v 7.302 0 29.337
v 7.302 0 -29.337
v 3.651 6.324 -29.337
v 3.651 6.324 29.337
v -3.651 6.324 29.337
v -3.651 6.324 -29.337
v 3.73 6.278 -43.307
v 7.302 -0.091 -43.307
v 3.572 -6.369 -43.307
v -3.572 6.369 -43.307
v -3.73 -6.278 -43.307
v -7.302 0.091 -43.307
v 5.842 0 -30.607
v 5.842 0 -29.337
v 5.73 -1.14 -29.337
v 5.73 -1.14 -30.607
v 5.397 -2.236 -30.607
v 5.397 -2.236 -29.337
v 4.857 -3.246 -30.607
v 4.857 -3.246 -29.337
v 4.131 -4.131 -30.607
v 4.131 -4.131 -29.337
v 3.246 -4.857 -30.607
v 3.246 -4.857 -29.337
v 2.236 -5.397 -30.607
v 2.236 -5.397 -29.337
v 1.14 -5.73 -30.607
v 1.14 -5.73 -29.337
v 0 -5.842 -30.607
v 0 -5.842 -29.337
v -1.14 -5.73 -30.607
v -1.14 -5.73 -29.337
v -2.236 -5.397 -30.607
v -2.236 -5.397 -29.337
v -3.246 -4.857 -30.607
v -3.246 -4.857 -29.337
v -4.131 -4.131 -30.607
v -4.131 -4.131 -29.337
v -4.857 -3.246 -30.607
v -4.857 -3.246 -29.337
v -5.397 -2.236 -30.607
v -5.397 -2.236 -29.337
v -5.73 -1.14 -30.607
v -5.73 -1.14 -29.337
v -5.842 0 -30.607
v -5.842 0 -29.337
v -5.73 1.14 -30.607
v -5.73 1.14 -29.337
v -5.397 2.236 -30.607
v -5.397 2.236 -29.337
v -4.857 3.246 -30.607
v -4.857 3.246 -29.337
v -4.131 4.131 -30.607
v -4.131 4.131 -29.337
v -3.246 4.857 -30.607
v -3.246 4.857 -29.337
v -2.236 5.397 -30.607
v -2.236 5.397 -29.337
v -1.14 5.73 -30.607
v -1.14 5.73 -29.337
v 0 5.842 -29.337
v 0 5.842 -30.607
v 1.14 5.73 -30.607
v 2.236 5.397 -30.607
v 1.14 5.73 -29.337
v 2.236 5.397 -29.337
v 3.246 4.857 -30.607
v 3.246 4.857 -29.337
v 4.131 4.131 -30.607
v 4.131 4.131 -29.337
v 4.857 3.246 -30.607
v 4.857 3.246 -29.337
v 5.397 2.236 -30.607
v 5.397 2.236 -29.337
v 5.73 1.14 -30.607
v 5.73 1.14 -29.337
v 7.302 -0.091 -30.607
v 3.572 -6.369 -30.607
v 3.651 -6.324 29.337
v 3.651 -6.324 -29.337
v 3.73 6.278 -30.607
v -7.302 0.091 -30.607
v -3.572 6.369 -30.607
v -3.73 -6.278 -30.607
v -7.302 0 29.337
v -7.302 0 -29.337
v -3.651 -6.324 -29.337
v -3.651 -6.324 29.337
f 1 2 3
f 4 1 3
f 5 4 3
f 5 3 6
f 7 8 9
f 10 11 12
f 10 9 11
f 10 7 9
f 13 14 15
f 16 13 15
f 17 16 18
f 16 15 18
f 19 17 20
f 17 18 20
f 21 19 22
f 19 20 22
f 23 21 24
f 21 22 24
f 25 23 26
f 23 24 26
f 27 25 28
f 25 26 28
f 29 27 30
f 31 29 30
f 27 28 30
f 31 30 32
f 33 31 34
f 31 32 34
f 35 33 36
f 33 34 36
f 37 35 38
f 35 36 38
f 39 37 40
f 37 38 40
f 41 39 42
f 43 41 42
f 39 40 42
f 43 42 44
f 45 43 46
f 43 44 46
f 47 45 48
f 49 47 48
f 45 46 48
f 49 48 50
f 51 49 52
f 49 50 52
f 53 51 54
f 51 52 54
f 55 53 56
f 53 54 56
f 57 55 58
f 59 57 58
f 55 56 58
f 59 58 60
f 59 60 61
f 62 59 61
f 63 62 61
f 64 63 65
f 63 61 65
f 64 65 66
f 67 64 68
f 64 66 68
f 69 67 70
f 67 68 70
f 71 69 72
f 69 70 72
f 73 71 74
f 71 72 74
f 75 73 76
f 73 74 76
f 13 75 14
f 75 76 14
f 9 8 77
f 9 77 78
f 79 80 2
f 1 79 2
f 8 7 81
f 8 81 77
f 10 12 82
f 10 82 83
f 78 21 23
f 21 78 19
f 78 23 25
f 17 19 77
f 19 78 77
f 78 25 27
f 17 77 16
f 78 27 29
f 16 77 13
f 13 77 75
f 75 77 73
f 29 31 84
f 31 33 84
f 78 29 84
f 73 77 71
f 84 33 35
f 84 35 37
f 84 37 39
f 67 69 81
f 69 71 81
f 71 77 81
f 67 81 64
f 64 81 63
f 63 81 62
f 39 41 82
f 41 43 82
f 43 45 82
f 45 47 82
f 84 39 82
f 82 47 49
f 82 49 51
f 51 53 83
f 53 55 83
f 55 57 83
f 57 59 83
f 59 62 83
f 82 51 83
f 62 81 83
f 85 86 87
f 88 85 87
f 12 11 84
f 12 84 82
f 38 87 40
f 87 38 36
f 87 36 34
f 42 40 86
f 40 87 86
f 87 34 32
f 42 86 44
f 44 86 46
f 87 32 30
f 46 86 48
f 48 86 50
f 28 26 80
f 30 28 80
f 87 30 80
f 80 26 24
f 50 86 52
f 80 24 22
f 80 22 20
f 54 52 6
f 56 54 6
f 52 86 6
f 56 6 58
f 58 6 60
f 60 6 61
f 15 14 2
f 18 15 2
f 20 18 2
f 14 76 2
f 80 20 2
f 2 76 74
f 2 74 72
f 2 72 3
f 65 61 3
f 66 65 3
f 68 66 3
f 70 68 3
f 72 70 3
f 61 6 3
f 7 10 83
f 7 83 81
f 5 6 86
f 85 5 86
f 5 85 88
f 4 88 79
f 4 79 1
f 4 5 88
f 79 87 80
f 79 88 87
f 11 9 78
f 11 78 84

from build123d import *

# Parameters (mm, degrees)
BOSS_EXTRUDE1_DEPTH = 29.337
SKETCH1_R           = 5.842
BOSS_EXTRUDE2_DEPTH = 1.27
BOSS_EXTRUDE3_DEPTH = 12.7


with BuildPart() as part:
    # Sketch 1 → Boss-Extrude1 (new, symmetric)
    with BuildSketch(Plane.XY):
        Polygon((7.3025, 0), (3.65125, 6.324150511), (-3.65125, 6.324150511), (-7.3025, 0), (-3.65125, -6.324150511), (3.65125, -6.324150511), align=None)
    extrude(amount=BOSS_EXTRUDE1_DEPTH, both=True)

    # Sketch1 → Boss-Extrude2 (add)
    with BuildSketch(Plane(origin=(0, 0, -29.337), x_dir=(-1, 0, 0), z_dir=(0, 0, -1))):
        with Locations(Location((0, 0, 0), (0, 0, 180))):
            Circle(SKETCH1_R)
    extrude(amount=BOSS_EXTRUDE2_DEPTH)

    # Sketch2 → Boss-Extrude3 (add)
    with BuildSketch(Plane(origin=(0, 0, -30.607), x_dir=(-1, 0, 0), z_dir=(0, 0, -1))):
        Polygon((3.729553625, -6.278290851), (7.301936182, 0.090742758), (3.572382557, 6.369033609), (-3.729553625, 6.278290851), (-7.301936182, -0.090742758), (-3.572382557, -6.369033609), align=None)
    extrude(amount=BOSS_EXTRUDE3_DEPTH)


solid = part.part
